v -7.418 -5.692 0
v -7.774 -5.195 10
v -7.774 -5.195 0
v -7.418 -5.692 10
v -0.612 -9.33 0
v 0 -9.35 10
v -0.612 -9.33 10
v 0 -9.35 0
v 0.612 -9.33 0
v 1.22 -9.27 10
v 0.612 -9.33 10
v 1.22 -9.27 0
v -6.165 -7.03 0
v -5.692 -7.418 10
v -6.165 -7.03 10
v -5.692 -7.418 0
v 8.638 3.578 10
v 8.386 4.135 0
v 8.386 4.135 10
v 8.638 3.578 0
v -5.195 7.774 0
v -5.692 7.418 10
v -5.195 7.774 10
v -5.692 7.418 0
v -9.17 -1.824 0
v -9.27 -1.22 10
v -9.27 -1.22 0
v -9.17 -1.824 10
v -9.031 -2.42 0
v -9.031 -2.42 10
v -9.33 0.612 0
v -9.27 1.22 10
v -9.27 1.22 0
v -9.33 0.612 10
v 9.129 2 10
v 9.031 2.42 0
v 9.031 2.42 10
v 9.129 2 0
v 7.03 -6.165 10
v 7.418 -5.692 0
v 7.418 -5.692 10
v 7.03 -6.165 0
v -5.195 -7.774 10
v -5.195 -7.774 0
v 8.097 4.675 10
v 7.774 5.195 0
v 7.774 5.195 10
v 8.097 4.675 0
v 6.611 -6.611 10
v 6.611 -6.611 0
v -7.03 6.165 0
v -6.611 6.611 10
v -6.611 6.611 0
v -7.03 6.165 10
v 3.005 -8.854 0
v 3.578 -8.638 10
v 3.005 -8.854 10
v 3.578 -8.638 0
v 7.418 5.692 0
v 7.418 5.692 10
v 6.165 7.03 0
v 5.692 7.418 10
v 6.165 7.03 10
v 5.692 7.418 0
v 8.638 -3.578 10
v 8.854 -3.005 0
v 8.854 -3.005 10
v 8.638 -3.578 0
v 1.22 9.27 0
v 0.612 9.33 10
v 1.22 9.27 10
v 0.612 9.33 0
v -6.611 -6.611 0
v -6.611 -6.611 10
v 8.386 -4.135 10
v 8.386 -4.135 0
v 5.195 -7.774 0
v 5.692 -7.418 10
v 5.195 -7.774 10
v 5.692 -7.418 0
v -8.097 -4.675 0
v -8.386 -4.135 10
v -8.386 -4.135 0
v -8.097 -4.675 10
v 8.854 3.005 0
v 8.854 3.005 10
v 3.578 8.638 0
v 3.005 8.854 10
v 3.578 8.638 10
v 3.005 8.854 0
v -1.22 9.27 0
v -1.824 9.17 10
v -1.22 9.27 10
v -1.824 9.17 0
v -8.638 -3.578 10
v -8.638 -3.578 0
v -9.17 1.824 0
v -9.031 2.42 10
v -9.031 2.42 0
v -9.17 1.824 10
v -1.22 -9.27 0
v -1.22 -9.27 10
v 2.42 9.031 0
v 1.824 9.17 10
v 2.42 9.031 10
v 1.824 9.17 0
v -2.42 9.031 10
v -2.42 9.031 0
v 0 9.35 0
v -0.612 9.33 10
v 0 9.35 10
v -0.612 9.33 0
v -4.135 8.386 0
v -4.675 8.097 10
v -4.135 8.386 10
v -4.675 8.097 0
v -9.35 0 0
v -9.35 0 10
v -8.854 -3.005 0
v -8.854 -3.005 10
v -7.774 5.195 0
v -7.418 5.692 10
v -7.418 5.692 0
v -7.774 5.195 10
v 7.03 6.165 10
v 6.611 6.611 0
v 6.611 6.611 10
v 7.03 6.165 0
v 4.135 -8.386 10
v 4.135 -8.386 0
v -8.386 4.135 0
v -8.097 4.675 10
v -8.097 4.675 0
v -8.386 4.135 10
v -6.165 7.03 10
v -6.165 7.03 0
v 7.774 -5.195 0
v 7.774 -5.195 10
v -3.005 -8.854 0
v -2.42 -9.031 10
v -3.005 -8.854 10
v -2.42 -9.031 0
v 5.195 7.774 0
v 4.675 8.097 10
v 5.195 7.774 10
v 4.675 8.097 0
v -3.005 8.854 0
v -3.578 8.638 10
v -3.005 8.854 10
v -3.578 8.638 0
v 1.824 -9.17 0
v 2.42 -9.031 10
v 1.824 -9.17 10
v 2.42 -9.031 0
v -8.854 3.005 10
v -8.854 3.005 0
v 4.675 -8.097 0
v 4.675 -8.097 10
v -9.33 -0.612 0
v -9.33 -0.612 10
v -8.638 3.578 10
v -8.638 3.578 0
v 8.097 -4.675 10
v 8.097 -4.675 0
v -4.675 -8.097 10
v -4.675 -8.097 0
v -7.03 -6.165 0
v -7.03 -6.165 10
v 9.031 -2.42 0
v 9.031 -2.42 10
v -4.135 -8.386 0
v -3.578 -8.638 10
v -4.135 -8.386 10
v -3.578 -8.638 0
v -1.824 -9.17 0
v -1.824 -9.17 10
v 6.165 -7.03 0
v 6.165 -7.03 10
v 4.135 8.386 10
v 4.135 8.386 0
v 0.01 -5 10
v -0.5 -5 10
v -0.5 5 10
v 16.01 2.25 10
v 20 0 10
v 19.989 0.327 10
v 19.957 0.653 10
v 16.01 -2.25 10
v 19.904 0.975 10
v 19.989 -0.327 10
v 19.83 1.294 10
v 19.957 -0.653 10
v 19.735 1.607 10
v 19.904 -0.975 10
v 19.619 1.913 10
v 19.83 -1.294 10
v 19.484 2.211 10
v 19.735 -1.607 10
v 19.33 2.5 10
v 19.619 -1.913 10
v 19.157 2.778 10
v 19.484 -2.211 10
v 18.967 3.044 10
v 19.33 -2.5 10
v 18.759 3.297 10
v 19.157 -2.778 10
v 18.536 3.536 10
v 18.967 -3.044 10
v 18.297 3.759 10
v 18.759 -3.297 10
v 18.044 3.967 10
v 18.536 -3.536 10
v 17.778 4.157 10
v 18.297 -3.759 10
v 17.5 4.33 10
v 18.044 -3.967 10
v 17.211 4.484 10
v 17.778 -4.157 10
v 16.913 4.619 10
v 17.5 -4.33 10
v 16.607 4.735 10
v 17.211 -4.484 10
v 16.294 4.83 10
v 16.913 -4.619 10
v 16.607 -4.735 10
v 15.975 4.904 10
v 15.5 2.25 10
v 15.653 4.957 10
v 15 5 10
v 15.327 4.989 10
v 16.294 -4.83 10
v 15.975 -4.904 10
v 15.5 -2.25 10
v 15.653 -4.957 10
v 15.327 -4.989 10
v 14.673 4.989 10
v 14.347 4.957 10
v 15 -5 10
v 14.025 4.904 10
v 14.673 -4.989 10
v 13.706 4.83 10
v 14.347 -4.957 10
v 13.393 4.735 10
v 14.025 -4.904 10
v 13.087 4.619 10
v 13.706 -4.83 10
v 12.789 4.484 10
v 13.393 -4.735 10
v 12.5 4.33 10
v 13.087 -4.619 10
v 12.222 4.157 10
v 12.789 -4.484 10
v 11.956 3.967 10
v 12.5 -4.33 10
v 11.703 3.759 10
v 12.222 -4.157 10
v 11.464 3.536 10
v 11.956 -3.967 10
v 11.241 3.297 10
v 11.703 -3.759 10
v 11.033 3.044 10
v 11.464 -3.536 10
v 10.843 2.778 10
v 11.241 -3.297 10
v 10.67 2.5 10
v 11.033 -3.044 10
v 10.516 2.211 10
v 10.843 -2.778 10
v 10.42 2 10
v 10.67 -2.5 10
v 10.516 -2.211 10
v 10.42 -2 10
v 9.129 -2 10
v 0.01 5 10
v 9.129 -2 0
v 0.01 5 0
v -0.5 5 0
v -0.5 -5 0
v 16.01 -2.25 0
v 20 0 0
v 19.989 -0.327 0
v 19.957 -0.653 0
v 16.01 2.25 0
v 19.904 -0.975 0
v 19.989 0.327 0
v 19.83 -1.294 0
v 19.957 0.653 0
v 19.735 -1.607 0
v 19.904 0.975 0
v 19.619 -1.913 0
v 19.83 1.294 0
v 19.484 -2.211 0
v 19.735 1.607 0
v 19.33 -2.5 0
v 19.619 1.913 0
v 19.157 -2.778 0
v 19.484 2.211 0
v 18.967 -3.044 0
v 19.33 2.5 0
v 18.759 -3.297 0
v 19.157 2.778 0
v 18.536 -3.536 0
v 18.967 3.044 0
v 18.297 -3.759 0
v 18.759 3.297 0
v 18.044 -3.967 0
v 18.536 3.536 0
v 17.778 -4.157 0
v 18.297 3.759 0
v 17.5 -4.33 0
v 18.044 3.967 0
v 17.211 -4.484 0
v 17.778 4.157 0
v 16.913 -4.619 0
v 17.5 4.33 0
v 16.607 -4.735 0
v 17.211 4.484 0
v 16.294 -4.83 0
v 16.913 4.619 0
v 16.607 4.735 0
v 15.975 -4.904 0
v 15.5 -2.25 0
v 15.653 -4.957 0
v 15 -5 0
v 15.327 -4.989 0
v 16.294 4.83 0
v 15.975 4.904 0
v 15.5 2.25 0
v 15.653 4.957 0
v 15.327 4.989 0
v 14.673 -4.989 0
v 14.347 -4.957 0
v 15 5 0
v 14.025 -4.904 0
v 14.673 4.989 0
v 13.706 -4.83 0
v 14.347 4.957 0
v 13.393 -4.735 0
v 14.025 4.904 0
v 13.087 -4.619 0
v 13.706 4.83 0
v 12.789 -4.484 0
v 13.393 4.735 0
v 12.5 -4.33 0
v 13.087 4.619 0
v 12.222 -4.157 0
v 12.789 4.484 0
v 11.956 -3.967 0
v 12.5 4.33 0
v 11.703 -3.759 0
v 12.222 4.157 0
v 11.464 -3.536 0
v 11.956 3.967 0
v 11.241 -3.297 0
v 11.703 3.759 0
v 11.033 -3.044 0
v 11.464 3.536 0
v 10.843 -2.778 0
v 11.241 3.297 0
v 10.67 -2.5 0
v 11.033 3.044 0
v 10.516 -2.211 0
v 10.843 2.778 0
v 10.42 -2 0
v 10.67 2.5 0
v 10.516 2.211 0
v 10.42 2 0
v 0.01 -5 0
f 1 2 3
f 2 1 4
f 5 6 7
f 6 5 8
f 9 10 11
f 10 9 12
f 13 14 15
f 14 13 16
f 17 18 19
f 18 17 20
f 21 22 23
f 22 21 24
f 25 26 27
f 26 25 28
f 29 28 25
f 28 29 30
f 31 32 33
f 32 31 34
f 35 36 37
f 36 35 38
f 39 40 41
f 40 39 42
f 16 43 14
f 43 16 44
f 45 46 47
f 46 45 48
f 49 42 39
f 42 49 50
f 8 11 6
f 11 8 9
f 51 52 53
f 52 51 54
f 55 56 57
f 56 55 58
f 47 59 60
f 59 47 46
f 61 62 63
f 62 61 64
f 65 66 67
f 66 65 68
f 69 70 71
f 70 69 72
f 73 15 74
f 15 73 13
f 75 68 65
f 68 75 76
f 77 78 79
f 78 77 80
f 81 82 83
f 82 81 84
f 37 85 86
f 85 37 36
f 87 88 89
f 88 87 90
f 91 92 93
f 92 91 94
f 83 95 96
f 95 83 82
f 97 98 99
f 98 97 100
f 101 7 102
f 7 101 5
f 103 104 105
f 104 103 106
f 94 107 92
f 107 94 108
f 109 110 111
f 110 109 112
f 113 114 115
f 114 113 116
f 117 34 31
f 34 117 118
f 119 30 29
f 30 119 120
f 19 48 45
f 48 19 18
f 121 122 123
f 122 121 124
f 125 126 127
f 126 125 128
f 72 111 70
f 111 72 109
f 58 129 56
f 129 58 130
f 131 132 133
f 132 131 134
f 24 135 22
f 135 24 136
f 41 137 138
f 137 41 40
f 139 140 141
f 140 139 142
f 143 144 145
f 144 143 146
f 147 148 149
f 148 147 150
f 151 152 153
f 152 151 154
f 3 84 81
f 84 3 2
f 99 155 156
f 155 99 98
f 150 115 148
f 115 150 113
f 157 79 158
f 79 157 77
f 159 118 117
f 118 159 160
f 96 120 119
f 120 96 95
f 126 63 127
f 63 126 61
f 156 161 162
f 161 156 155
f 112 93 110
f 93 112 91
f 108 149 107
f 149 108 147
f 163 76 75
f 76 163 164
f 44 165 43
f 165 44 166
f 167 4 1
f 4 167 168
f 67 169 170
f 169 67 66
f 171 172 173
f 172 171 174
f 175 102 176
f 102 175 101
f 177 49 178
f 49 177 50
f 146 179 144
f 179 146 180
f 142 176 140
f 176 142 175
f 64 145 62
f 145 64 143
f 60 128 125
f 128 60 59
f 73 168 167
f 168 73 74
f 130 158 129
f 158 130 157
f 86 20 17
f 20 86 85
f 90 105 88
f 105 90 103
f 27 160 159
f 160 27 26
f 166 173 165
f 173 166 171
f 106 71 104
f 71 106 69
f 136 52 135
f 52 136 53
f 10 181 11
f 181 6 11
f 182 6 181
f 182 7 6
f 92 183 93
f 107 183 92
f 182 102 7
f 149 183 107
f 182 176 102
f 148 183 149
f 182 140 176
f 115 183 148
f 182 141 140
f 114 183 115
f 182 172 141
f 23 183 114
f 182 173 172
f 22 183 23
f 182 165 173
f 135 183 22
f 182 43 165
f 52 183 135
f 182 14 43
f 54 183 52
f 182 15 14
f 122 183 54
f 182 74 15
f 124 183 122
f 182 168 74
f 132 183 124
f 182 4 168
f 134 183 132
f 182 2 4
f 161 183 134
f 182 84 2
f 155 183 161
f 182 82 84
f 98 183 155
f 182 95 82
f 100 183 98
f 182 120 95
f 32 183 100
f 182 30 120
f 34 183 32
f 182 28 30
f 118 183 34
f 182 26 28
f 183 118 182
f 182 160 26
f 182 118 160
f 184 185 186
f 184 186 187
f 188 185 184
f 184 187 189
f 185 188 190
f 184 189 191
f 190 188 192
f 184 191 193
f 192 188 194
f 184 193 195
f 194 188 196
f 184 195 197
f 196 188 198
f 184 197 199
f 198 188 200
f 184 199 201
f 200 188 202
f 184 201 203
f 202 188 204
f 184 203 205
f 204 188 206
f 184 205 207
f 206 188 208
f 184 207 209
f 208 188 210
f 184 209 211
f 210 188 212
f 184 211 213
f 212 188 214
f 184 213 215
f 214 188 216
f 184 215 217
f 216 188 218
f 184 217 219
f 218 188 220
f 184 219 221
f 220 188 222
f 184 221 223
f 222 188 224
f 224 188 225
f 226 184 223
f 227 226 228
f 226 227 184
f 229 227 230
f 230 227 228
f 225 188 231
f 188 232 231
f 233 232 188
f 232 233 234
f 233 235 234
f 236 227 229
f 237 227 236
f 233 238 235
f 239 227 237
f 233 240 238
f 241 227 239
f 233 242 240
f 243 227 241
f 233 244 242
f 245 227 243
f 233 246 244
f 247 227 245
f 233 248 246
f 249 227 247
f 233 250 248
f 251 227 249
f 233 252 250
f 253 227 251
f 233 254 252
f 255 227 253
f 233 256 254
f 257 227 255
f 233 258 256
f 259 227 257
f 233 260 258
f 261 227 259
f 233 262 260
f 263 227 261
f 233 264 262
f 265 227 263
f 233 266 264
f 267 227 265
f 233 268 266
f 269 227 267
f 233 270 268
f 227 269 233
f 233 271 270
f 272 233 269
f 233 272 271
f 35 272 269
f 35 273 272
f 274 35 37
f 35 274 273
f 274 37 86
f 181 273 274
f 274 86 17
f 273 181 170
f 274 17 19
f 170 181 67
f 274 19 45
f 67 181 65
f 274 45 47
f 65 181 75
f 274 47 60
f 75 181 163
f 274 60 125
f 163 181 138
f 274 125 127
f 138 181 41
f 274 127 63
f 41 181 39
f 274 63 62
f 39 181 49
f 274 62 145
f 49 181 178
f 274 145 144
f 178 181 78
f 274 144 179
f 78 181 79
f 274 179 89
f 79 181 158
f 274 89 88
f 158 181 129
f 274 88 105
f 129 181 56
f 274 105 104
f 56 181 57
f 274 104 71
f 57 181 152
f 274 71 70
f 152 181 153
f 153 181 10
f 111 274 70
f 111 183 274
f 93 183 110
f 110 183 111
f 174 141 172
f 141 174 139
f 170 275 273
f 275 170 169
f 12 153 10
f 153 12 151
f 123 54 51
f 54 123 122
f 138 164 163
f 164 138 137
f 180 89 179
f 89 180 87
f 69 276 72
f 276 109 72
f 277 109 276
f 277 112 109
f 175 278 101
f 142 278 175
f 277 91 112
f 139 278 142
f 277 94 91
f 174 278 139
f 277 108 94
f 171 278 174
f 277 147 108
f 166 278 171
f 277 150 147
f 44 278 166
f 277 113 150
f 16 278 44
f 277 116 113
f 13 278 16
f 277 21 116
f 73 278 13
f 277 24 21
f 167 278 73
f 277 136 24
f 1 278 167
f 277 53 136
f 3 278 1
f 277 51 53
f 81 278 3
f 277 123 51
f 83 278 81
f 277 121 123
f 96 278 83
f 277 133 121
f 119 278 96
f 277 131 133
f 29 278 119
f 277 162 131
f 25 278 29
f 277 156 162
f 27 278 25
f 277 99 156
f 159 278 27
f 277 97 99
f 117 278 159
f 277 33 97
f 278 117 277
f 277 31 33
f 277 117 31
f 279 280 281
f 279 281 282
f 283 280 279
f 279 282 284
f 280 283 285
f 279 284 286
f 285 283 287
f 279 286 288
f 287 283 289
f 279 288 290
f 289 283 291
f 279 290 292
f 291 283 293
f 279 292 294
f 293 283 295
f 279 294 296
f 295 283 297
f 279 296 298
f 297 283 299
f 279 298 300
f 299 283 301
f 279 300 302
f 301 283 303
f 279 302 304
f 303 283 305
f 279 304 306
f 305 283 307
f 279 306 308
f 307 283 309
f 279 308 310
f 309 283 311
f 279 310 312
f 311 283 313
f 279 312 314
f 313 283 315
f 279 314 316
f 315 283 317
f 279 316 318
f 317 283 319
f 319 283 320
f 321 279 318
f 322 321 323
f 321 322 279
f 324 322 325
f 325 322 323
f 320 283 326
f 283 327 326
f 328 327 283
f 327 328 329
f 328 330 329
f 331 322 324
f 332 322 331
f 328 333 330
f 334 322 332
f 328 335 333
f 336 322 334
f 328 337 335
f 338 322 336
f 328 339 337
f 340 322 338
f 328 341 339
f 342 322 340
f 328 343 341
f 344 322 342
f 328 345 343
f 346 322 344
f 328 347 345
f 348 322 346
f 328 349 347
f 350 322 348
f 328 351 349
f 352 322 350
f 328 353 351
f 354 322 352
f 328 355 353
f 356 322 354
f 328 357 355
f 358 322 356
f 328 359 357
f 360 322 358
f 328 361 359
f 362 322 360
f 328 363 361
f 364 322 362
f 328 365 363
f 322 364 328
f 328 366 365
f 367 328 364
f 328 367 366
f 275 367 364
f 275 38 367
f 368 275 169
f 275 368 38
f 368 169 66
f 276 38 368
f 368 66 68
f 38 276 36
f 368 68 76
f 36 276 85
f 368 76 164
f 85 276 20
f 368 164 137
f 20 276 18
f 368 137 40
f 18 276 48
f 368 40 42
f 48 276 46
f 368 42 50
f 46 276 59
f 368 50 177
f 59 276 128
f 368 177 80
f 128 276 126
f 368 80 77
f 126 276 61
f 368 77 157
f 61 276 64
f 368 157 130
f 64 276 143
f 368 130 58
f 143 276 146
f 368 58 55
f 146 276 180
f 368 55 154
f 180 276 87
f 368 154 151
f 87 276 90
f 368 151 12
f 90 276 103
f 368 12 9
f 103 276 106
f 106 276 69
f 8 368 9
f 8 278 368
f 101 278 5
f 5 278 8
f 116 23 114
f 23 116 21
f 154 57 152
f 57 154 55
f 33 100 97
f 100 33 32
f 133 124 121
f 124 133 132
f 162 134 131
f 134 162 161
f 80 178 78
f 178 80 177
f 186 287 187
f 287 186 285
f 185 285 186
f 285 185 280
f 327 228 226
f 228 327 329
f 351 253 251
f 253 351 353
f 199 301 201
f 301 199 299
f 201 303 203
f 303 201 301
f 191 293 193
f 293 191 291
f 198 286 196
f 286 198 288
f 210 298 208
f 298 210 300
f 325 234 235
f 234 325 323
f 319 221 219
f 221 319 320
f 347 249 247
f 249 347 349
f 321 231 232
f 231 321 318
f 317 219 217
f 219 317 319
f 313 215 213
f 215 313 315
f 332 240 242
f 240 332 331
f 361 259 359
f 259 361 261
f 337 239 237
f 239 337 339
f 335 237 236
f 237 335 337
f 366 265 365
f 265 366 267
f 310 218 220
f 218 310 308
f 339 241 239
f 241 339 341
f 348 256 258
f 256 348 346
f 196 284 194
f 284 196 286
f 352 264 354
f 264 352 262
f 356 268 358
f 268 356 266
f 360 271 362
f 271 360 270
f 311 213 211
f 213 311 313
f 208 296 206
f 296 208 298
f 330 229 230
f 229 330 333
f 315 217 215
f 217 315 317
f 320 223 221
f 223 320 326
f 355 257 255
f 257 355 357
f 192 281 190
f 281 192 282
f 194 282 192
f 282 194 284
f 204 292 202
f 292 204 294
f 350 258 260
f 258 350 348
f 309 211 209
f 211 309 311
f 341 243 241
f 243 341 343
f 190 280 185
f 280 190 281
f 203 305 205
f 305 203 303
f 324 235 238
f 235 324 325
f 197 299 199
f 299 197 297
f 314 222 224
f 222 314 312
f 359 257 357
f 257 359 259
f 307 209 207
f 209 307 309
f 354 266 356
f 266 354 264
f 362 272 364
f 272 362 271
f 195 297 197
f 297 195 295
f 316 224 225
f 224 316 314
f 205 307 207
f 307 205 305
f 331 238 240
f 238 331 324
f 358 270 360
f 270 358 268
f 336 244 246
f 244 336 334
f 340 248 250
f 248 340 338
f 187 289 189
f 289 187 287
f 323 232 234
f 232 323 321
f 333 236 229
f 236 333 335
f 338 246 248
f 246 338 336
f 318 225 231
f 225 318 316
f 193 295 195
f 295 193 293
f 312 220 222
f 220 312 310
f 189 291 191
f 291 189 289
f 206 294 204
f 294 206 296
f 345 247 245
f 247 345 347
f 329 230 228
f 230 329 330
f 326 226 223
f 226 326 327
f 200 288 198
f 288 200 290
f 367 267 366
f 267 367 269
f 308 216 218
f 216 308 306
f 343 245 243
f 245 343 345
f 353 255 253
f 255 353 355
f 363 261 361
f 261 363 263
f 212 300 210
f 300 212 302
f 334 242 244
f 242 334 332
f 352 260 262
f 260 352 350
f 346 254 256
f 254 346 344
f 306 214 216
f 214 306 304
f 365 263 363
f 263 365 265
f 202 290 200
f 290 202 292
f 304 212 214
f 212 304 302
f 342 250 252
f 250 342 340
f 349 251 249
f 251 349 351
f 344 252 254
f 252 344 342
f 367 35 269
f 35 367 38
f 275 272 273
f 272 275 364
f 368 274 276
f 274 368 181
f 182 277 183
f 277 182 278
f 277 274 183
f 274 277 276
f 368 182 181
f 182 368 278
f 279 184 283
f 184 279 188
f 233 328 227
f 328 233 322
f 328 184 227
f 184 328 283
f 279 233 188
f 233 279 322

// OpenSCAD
// Stand rod and tubing clip - printed flat, snaps onto a 12.7 mm stand rod and holds a small
// piece of tubing next to it. A solid bridge joins the two rings without blocking either hole.
//

// ---------------- Parameters ----------------
stand_d      = 12.7;   // stand rod diameter
stand_wall   = 3;      // stand ring wall thickness
stand_open_w = 10;     // stand ring opening width (x < 0, -5 < y < 5)

tub_d        = 6;      // tubing inner diameter
tub_wall     = 2;      // tubing ring wall thickness
tub_open_w   = 4.5;    // tubing ring opening width (x > 15, -2.25 < y < 2.25)

bridge_x0    = 8;      // bridge start (X)
bridge_x1    = 12;     // bridge end (X)
bridge_w     = bridge_x1 - bridge_x0; // bridge width (Y), 6 mm

h            = 10;     // extrusion height (Z)

eps          = 0.5;    // cutter overshoot past faces
$fn          = 96;     // curve resolution

// ---------------- Derived ----------------
stand_od = stand_d + 2 * stand_wall;        // 18.7 mm
tub_od   = tub_d + 2 * tub_wall;            // 10 mm

// ---------------- Model ----------------
difference() {
    union() {
        // Stand ring
        cylinder(d = stand_od, h = h);
        // Tubing ring, centred at x = 15
        translate([15, 0, 0])
            cylinder(d = tub_od, h = h);
        // Solid bridge between x = 8 and x = 12
        translate([bridge_x0, -bridge_w / 2, 0])
            cube([bridge_w, bridge_w, h]);
    }
    // Stand opening: x < 0, -5 < y < 5
    translate([-eps, -5, 0])
        cube([eps + 0.01, 10, h + 1]);
    // Tubing opening: x > 15, -2.25 < y < 2.25
    translate([15 + eps, -tub_open_w / 2, 0])
        cube([eps + 0.01, tub_open_w, h + 1]);
}
